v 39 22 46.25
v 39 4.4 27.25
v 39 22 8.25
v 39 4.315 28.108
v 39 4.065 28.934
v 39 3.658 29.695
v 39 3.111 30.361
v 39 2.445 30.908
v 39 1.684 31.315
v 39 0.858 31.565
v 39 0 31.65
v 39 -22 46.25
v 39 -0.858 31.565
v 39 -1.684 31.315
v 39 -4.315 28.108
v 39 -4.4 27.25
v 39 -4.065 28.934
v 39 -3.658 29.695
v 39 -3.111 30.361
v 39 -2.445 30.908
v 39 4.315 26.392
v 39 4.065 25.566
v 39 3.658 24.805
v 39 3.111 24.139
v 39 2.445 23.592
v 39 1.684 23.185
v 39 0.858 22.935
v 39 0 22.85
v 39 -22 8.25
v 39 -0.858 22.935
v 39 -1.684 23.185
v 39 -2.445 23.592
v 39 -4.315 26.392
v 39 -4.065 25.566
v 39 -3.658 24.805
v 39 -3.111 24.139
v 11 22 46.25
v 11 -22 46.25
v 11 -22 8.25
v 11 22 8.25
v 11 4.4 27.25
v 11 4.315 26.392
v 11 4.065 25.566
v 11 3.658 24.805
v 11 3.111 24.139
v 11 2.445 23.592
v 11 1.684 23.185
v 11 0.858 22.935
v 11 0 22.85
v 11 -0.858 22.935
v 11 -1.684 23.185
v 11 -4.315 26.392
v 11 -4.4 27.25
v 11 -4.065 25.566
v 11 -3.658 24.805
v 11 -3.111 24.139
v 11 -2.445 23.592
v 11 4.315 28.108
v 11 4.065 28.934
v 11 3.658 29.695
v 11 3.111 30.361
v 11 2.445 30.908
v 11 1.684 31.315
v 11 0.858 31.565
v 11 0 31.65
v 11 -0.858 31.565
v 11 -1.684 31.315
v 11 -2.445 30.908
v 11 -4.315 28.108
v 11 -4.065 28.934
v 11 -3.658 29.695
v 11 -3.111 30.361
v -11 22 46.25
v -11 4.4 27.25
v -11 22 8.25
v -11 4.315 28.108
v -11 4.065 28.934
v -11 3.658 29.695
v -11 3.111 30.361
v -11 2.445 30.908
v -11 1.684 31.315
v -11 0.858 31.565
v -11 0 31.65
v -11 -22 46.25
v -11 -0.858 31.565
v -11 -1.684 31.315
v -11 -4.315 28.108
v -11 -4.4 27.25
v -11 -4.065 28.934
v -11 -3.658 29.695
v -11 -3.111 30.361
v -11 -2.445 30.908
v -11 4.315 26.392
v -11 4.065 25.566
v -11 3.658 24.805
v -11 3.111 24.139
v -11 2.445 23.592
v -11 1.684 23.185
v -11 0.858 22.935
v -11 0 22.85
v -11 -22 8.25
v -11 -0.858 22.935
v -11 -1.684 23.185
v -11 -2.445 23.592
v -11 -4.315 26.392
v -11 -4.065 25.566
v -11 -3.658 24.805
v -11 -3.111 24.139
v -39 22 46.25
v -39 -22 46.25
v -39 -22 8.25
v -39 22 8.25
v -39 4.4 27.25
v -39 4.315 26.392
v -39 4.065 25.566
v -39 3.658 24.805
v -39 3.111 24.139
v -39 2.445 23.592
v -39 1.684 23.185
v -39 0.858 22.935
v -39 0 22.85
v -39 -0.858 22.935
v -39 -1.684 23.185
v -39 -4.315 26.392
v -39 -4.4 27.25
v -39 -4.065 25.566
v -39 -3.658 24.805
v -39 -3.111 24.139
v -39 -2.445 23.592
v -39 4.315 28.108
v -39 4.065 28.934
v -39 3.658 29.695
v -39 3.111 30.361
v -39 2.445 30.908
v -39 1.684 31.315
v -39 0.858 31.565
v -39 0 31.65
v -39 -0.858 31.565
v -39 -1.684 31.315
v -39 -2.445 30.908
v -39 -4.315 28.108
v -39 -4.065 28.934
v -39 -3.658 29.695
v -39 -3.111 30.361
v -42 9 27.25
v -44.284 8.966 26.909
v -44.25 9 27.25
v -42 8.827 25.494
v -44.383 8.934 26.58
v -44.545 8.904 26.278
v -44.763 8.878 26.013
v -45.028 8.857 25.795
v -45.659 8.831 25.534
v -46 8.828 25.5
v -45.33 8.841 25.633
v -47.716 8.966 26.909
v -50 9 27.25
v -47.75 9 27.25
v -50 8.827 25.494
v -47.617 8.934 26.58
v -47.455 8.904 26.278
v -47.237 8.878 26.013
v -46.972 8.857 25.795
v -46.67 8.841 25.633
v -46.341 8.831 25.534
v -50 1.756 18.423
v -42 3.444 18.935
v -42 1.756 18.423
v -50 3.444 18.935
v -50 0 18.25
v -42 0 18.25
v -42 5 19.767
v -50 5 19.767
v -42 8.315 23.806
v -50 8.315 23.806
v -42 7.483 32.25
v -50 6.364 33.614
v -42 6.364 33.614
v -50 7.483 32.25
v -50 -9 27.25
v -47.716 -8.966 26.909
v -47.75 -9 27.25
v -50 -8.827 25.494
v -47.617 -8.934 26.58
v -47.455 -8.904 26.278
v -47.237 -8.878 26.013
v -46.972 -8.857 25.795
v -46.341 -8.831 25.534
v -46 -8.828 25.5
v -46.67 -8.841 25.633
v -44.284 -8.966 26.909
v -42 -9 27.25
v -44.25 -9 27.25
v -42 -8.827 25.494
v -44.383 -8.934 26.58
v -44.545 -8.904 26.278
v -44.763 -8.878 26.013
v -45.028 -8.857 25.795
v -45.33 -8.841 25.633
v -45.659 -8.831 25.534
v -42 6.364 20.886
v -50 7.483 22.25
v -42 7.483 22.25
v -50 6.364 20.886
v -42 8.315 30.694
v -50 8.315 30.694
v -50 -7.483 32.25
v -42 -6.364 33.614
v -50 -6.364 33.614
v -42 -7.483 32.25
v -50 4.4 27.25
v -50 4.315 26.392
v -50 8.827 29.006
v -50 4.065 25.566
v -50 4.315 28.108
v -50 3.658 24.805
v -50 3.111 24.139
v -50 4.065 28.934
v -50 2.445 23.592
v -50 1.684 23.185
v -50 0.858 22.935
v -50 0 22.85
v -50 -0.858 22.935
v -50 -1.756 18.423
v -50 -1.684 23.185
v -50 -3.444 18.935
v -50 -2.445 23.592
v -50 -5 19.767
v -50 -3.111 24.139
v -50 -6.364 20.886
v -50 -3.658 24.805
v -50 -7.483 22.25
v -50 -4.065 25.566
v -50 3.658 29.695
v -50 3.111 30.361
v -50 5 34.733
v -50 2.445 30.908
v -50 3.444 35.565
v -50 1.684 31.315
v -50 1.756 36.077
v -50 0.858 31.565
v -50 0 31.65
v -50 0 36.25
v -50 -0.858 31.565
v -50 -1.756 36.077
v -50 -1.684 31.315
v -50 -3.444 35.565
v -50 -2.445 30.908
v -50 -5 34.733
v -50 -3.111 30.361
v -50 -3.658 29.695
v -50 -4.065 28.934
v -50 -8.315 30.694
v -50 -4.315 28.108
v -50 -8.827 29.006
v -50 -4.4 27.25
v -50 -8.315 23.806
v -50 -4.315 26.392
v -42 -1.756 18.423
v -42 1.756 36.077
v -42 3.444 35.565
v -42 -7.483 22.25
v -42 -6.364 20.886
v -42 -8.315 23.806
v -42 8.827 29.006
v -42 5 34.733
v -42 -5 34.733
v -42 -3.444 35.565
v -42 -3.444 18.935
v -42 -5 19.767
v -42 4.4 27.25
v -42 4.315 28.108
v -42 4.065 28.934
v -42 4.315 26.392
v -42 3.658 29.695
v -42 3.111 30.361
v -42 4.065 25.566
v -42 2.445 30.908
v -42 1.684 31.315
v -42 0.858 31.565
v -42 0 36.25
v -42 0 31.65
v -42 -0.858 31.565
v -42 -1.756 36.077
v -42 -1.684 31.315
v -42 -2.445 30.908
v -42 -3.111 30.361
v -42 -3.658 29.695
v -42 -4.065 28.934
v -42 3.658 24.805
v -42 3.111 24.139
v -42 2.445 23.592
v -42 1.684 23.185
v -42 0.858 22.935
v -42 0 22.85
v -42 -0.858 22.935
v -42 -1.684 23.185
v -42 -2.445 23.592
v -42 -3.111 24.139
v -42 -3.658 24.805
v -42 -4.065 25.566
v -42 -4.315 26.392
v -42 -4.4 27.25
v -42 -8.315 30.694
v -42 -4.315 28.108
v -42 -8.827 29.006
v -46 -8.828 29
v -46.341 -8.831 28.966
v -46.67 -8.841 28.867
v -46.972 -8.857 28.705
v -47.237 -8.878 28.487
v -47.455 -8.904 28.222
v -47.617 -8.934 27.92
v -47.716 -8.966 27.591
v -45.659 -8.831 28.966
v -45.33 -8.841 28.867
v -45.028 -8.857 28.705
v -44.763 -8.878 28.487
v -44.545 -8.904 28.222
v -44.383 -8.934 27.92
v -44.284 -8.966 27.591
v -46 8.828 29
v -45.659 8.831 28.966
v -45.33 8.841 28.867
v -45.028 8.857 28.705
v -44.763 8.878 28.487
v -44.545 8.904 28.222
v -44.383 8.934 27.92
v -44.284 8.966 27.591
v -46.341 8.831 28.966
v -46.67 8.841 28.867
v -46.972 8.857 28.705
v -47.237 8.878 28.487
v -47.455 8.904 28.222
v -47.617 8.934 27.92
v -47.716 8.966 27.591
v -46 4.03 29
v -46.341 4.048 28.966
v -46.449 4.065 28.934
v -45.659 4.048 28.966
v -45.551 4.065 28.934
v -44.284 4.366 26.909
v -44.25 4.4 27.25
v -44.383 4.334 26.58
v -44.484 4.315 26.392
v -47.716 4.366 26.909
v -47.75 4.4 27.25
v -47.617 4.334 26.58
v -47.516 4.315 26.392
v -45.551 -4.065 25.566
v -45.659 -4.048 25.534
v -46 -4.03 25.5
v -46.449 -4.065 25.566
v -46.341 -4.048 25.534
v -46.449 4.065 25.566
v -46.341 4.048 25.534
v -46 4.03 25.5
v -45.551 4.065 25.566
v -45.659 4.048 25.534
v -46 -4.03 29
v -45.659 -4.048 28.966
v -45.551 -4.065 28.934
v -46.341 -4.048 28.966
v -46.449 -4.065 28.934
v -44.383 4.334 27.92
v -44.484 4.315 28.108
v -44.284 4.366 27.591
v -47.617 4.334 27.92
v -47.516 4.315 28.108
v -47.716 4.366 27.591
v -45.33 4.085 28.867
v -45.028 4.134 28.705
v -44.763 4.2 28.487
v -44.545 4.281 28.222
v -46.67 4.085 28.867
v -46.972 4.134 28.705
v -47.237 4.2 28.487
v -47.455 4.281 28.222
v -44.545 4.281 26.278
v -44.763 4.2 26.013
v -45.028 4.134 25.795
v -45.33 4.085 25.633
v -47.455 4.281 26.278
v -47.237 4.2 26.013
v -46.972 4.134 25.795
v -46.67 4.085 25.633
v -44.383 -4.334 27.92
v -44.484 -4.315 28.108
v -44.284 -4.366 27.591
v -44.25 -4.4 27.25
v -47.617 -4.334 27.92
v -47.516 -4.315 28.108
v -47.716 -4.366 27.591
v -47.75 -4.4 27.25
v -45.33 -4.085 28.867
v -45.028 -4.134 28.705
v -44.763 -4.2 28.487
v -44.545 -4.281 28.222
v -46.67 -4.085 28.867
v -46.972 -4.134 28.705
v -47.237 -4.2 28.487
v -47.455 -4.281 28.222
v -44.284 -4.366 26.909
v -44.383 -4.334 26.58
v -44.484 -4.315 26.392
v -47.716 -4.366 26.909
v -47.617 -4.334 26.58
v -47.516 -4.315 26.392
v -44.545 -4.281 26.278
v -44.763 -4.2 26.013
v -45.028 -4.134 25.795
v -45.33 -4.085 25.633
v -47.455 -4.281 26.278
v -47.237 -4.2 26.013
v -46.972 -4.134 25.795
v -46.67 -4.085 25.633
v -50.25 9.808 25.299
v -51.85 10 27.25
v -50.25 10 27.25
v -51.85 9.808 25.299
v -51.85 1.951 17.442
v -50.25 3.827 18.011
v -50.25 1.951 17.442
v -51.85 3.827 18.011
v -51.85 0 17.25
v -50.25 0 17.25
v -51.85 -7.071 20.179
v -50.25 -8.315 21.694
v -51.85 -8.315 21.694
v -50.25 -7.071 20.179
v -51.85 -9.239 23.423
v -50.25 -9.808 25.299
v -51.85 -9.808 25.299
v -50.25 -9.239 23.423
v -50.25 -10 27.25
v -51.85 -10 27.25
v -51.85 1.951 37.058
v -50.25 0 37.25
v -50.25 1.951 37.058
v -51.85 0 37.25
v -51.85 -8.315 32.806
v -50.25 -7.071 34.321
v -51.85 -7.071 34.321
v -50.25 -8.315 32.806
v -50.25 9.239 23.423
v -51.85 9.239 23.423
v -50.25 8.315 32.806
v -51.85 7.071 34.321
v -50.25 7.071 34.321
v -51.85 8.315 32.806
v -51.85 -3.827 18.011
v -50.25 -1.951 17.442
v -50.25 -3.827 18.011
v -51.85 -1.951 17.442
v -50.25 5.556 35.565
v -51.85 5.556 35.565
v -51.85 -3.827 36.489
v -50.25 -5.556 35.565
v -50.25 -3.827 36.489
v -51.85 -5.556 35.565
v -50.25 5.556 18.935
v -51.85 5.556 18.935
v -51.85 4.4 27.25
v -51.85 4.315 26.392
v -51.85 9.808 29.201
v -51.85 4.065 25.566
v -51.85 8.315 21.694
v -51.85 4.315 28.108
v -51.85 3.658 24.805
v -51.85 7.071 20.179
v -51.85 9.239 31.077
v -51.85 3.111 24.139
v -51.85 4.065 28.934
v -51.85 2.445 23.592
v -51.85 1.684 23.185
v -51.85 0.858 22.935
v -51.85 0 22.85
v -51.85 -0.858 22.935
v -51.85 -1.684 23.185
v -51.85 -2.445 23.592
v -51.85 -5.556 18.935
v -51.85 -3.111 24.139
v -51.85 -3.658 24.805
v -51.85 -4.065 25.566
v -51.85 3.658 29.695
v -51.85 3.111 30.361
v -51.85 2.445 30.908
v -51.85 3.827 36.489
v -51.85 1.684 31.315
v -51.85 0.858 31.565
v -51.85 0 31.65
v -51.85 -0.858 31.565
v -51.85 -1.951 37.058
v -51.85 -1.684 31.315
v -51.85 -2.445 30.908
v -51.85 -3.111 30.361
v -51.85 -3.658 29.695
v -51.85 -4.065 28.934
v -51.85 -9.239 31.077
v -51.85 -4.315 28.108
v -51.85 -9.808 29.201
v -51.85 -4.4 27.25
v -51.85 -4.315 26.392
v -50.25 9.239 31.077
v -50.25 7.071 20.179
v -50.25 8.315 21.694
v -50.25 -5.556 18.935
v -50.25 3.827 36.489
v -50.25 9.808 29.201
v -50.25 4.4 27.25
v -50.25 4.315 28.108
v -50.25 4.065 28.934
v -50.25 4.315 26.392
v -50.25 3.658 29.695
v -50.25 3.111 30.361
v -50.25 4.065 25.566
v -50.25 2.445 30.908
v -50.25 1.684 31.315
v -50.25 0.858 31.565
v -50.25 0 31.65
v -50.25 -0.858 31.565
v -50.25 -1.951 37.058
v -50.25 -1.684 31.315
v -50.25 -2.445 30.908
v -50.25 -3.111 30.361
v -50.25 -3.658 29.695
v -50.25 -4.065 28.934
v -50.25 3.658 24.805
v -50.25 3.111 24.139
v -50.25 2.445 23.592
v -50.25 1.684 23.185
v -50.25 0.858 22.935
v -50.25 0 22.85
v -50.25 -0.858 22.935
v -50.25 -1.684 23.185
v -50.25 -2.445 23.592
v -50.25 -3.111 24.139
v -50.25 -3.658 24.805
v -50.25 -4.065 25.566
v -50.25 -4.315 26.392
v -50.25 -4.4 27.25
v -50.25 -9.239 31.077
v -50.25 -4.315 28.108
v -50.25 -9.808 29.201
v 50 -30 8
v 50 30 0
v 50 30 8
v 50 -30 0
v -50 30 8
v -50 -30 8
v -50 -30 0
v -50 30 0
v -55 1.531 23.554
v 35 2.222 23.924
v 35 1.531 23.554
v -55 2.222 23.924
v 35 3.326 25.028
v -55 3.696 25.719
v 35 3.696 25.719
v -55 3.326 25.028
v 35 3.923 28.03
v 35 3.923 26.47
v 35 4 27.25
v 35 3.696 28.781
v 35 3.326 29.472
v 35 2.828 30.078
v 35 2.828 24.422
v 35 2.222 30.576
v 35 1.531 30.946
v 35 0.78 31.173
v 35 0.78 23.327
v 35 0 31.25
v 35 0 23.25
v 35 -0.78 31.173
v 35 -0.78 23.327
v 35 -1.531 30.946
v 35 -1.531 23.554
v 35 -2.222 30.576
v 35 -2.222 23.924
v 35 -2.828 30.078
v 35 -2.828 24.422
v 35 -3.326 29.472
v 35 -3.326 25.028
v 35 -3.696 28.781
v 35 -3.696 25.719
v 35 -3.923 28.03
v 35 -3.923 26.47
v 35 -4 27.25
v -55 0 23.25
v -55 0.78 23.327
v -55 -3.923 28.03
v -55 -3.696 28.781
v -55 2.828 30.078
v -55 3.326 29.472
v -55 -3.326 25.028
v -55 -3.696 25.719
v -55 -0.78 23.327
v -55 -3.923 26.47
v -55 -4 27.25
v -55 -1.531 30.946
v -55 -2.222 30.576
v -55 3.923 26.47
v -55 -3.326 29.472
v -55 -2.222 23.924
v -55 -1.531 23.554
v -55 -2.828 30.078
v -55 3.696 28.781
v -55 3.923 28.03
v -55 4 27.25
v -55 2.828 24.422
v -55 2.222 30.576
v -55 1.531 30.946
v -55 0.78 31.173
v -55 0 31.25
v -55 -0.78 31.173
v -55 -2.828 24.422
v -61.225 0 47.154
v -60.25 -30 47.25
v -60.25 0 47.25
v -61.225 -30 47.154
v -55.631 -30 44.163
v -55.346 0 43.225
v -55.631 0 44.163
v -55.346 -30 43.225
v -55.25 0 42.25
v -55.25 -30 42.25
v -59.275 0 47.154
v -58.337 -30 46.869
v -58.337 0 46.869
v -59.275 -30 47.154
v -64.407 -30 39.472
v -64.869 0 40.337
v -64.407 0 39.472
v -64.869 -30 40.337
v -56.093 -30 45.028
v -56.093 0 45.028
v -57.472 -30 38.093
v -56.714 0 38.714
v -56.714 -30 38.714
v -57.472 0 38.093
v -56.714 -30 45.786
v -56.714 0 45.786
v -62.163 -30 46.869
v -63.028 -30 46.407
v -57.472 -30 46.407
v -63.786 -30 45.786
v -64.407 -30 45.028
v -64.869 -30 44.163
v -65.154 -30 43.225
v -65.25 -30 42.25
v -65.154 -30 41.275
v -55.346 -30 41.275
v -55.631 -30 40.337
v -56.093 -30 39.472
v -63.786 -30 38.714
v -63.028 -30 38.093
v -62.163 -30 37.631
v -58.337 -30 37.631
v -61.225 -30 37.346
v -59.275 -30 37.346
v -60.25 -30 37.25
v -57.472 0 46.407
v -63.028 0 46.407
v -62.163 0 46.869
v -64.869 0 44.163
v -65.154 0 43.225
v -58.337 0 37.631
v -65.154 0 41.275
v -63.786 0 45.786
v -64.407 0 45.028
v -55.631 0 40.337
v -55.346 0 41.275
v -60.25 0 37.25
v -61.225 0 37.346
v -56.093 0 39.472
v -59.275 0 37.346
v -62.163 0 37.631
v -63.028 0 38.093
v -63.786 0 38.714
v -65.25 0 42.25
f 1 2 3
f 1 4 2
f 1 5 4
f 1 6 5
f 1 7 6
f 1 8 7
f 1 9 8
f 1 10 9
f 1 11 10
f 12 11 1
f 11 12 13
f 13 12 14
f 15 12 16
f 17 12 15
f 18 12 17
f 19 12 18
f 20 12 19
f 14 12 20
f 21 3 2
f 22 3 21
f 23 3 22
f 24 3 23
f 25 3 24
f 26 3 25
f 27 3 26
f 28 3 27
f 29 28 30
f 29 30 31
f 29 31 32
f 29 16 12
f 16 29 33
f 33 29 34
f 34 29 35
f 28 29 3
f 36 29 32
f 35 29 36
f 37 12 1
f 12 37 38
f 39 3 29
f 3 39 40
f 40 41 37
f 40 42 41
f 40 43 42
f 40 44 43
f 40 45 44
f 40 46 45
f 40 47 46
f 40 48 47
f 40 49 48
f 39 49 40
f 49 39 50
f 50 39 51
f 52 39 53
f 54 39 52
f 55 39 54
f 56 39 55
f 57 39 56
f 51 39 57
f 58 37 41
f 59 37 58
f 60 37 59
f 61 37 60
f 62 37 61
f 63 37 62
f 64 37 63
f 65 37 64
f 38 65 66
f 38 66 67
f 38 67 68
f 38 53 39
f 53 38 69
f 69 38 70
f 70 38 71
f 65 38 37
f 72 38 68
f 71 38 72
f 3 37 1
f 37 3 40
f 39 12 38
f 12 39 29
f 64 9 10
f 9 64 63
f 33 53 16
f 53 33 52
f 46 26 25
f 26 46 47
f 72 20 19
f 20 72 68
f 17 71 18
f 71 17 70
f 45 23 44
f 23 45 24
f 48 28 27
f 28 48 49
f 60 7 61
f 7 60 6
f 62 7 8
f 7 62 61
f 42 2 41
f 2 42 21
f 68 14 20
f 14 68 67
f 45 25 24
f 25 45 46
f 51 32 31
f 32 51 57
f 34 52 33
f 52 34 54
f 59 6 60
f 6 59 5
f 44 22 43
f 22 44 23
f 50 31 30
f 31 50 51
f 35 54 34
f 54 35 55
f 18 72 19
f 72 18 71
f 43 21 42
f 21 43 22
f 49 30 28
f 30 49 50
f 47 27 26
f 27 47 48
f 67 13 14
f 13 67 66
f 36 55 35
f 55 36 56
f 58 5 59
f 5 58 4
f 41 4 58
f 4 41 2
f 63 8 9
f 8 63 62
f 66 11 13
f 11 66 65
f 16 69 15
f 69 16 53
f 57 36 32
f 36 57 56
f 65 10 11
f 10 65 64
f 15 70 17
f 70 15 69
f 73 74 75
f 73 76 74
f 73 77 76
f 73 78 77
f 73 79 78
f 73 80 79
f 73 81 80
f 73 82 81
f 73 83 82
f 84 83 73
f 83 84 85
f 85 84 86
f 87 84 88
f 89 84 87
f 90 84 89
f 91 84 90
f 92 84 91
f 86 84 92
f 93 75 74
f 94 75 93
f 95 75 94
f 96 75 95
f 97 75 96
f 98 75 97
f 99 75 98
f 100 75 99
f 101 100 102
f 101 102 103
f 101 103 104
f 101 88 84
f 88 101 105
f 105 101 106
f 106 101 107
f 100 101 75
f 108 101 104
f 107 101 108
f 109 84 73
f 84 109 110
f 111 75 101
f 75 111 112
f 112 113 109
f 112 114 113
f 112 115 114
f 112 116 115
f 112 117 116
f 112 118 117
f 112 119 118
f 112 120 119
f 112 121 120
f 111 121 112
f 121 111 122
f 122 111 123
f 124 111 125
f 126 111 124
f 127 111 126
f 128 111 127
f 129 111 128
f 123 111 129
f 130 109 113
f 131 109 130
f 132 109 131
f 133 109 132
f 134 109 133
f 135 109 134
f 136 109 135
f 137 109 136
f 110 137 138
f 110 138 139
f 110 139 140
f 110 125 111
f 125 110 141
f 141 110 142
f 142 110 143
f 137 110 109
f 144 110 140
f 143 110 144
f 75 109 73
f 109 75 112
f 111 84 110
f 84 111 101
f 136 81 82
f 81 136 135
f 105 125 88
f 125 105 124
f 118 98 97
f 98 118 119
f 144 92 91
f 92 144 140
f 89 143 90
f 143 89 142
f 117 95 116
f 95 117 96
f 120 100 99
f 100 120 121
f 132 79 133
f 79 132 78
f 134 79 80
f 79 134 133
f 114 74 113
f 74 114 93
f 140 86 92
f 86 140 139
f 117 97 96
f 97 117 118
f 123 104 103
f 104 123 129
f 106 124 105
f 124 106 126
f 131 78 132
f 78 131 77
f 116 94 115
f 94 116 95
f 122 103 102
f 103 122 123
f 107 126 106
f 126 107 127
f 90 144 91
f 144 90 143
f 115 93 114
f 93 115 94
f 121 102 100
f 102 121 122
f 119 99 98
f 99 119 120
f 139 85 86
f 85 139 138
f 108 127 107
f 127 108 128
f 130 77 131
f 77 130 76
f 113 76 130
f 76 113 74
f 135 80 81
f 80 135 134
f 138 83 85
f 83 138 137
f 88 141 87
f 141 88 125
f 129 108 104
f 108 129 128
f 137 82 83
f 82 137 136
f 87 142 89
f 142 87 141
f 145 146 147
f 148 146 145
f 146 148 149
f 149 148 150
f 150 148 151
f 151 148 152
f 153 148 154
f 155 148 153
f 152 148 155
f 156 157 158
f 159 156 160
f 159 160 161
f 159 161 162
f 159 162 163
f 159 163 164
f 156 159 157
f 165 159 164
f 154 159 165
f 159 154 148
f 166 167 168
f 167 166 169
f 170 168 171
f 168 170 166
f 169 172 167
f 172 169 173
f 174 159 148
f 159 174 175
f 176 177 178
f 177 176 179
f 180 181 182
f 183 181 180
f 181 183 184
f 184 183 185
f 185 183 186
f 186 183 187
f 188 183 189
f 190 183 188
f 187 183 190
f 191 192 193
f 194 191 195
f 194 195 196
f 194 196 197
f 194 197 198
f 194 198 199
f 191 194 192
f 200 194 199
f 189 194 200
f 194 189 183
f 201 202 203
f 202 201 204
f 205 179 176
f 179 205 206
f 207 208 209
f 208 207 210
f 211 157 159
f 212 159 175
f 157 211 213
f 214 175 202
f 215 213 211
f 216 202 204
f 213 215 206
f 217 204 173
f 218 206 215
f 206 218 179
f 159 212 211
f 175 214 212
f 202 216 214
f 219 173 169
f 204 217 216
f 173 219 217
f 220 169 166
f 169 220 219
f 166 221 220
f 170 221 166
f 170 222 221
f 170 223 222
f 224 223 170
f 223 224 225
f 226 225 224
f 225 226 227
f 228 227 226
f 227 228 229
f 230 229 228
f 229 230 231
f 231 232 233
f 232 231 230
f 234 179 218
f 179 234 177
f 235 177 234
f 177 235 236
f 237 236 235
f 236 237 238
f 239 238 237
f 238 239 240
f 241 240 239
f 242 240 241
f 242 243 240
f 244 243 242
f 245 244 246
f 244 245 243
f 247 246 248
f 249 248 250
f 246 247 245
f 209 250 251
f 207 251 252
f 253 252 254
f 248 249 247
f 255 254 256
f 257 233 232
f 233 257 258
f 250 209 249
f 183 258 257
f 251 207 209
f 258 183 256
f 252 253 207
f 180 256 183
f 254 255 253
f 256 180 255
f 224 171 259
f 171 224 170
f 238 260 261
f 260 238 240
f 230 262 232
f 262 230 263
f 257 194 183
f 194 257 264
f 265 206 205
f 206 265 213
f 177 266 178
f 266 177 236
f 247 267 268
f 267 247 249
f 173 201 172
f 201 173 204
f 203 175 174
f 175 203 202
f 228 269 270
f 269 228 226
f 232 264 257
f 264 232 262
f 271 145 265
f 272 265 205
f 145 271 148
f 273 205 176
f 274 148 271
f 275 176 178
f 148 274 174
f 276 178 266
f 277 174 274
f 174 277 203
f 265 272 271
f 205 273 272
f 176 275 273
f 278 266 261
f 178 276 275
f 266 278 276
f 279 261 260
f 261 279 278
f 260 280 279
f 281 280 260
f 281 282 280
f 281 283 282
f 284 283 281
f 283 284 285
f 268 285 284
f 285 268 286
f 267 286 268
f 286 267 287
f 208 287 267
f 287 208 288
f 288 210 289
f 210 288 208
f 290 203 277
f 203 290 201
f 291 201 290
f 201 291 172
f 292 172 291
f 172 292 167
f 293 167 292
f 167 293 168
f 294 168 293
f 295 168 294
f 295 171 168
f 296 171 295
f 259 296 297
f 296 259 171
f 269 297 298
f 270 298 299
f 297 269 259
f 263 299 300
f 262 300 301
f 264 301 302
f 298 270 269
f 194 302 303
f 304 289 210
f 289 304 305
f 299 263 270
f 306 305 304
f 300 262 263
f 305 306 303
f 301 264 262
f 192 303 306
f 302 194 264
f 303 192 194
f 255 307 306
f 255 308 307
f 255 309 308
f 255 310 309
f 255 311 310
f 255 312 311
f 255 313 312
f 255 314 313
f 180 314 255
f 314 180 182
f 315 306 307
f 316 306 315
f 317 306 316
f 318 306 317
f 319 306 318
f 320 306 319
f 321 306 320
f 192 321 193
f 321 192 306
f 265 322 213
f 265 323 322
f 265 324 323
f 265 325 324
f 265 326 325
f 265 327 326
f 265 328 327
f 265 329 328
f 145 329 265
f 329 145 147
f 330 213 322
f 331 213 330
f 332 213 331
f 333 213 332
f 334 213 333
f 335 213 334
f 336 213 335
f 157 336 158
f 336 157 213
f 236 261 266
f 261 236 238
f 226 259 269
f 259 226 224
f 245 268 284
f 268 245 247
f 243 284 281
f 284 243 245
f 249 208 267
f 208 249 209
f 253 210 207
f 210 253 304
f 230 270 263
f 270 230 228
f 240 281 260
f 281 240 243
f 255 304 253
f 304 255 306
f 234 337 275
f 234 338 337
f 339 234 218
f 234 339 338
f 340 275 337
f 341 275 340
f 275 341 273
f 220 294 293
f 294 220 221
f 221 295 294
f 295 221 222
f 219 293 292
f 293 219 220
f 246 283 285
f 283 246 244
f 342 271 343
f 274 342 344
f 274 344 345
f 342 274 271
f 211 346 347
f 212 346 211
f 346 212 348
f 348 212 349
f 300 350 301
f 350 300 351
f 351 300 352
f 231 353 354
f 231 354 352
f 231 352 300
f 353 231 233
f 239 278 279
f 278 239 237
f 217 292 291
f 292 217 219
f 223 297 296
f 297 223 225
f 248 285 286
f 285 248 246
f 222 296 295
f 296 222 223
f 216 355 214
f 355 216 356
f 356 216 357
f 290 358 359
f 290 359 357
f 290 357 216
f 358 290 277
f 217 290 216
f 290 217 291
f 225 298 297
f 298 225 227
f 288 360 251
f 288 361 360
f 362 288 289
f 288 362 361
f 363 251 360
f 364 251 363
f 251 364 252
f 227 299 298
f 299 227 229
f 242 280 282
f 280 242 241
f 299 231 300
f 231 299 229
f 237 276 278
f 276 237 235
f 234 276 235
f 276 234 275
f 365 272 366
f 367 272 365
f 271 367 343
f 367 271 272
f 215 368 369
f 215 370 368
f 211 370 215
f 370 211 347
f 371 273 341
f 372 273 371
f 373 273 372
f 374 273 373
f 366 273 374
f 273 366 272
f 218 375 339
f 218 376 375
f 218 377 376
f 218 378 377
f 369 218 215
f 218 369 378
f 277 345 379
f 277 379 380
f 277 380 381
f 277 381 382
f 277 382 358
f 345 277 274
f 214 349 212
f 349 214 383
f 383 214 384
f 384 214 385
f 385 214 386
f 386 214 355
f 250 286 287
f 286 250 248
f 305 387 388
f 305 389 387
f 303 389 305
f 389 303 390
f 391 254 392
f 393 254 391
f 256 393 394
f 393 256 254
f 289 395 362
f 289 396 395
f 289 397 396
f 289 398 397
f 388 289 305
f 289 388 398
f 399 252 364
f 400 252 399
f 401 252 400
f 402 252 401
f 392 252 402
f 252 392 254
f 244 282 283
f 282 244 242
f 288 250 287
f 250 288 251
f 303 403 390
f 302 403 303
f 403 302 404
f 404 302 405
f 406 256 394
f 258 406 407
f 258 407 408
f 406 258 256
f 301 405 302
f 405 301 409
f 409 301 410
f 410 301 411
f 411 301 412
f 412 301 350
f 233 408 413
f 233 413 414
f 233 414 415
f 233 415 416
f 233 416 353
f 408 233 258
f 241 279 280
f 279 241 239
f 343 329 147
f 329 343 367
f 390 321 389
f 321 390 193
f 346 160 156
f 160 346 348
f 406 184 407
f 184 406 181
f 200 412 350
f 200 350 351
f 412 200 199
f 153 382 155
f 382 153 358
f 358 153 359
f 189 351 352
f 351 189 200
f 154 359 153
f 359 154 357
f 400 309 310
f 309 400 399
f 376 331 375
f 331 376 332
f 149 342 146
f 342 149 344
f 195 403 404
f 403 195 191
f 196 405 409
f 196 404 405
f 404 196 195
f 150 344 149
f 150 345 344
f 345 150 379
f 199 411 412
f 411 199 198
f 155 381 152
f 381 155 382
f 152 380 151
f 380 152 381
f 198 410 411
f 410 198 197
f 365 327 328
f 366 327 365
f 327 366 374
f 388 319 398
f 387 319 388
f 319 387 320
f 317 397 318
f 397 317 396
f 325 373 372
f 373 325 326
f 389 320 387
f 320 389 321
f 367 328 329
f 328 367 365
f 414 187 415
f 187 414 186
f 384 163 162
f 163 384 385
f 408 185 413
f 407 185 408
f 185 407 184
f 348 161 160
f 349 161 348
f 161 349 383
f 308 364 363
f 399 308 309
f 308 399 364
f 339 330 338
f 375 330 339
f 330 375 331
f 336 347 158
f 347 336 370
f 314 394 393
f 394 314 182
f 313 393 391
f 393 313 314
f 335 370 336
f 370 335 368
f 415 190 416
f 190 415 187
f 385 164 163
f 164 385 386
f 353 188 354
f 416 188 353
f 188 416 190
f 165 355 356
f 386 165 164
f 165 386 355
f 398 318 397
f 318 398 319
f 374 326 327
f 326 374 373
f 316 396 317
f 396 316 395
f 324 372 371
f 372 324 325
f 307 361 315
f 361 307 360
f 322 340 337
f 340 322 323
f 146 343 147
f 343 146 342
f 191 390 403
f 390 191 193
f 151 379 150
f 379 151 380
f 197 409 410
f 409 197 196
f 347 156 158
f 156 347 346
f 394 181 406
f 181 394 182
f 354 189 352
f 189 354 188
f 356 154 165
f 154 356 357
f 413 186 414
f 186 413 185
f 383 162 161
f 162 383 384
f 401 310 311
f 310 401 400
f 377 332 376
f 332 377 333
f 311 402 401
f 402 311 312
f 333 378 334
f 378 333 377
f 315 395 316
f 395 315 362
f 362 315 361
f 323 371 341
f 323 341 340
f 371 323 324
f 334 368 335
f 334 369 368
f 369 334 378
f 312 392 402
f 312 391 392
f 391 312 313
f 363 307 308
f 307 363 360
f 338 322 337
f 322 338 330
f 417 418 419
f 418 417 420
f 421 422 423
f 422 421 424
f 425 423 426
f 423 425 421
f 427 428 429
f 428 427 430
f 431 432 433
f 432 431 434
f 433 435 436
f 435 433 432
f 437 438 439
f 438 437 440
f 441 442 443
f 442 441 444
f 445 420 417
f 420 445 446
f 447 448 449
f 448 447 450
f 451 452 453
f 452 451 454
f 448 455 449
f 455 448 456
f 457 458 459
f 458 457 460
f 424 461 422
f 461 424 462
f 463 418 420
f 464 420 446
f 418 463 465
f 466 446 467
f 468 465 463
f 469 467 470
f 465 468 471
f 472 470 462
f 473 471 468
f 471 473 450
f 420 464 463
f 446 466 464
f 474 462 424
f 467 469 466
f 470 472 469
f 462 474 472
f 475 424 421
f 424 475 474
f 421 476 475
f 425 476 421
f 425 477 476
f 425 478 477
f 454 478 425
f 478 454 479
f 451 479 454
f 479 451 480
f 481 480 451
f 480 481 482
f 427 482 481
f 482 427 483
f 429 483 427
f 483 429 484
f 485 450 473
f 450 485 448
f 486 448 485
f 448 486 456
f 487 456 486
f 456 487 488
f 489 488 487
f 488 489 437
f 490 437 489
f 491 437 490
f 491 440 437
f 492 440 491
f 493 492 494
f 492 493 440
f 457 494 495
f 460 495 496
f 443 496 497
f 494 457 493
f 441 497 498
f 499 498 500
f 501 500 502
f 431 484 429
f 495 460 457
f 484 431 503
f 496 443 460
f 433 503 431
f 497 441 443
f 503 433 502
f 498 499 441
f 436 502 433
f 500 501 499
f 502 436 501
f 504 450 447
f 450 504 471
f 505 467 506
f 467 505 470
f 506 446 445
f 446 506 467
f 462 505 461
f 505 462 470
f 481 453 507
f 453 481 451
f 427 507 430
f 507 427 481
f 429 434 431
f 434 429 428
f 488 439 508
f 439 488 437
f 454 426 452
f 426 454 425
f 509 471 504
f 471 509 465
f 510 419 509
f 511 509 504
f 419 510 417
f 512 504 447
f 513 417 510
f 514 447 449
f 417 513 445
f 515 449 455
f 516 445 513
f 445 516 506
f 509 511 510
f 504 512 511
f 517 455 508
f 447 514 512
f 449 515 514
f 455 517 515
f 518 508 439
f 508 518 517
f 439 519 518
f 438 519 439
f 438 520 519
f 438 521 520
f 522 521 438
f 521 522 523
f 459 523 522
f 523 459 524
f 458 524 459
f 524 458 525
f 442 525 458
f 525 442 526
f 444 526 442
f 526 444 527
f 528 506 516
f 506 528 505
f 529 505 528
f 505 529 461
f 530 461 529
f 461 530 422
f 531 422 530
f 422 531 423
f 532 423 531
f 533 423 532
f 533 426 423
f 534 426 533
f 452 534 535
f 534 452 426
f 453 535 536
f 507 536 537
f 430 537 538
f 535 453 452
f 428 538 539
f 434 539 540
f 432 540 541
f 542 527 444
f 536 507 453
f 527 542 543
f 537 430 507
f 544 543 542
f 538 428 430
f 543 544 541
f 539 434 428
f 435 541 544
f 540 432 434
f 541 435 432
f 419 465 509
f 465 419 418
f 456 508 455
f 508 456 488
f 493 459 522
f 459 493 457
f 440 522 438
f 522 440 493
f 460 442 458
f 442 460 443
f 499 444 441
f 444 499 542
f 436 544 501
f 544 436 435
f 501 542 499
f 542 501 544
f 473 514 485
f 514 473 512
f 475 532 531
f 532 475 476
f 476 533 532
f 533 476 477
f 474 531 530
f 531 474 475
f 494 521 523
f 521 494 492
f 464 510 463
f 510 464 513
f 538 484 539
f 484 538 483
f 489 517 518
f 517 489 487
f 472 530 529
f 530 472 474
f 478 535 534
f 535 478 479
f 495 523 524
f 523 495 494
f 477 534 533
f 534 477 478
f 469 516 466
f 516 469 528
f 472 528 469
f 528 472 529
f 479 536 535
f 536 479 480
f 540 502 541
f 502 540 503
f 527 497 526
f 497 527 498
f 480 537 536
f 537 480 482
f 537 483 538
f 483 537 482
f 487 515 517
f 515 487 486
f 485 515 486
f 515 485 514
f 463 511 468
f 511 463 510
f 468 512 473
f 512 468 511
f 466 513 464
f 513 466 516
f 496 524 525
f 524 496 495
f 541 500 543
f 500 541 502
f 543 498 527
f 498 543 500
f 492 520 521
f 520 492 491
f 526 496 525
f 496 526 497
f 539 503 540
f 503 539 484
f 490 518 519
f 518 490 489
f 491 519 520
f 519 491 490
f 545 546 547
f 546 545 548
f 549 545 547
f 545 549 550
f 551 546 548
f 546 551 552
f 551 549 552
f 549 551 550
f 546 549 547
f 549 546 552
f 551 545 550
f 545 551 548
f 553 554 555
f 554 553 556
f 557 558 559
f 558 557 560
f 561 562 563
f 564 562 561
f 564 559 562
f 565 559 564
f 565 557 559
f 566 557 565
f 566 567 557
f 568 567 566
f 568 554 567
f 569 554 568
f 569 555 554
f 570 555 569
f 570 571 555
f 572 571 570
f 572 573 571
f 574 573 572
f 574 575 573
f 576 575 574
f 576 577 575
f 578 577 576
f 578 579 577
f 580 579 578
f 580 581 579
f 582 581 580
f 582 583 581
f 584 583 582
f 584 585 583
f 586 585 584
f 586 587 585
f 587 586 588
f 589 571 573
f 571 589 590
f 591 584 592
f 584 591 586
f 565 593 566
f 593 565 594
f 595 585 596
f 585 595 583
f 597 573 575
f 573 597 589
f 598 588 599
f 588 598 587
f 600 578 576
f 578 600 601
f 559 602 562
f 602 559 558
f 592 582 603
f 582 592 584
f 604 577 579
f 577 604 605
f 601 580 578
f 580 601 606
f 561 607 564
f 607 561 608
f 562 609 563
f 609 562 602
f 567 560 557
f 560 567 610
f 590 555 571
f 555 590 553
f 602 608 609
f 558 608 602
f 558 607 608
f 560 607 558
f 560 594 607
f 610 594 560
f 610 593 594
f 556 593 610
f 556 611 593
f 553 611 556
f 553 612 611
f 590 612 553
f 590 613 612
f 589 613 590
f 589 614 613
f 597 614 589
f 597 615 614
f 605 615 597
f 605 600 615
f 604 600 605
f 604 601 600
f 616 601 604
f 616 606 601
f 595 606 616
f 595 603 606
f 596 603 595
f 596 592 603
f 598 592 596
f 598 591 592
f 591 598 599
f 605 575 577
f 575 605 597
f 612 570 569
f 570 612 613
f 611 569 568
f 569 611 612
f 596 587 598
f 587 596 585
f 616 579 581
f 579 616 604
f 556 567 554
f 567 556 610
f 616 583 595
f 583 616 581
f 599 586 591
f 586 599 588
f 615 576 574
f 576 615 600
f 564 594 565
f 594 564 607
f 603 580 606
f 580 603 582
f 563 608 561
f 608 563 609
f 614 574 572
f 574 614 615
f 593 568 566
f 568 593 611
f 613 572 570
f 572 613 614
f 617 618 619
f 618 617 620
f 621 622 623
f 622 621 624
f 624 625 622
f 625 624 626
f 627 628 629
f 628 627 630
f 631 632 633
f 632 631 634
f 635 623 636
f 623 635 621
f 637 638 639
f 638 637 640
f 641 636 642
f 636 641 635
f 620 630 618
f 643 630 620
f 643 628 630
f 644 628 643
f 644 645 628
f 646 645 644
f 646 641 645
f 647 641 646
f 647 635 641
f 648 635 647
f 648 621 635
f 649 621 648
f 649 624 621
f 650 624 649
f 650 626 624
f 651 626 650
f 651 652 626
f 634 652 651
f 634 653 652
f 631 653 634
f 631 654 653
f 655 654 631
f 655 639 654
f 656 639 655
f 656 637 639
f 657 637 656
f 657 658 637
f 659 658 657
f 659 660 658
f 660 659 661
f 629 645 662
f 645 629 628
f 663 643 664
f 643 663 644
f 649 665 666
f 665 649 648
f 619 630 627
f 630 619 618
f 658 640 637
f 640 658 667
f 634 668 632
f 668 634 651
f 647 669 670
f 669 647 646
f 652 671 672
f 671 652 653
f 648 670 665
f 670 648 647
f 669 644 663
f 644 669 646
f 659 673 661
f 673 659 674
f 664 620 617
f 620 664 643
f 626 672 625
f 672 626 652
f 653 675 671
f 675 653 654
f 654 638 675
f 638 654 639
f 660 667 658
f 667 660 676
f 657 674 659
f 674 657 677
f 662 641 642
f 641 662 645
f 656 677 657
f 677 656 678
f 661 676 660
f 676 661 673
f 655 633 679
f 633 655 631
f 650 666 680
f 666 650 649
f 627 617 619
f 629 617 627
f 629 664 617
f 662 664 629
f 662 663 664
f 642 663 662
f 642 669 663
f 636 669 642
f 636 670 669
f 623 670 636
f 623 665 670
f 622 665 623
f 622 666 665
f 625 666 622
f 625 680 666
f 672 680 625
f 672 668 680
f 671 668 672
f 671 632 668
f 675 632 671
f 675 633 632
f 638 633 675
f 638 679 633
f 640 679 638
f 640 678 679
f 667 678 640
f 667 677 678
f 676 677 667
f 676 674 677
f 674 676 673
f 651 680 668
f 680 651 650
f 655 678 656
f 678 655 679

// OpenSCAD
$fn = 32;

// ------------------------------------------------------------------------
// Machine vise: screw d8, jaws 28 x 38 mm
// Every part is its own module, assembly() places every instance.
// ------------------------------------------------------------------------

// --- part 1 ---
module vise_bed() {
  difference() {
    translate([-50, -30, 0]) cube([100, 60, 8]);
  }
}

// --- part 2 ---
module vise_jaw() {
  difference() {
    translate([-14, -22, 0]) cube([28, 44, 38]);
    translate([0, 0, 19]) rotate([0, 90, 0]) cylinder(h = 30, d = 8.8, center = true);
  }
}

// --- part 3 ---
module vise_screw() {
  translate([0, 0, -45]) cylinder(h = 90, d = 8);
}

// --- part 4 ---
module screw_collar() {
  difference() {
    cylinder(h = 8, d = 18);
    translate([0, 0, -1]) cylinder(h = 10, d = 8.8);
    translate([0, 0, 4]) rotate([90, 0, 0]) cylinder(h = 20, d = 3.5, center = true);
  }
}

// --- part 5 ---
module screw_washer() {
  difference() {
      translate([0, 0, 0]) cylinder(h = 1.6, d = 20);
      translate([0, 0, -1]) cylinder(h = 3.6, d = 8.8);
    }
}

// --- part 6 ---
module vise_handle() {
  cylinder(h = 30, d = 10);
}

// --- assembly ---
module assembly() {
  color([0.80, 0.24, 0.20]) translate([0, 0, 0]) rotate([0, 0, 0]) vise_bed();
  color([0.20, 0.45, 0.75]) translate([25, 0, 8.25]) rotate([0, 0, 0]) vise_jaw();
  color([0.25, 0.62, 0.32]) translate([-25, 0, 8.25]) rotate([0, 0, 0]) vise_jaw();
  color([0.92, 0.70, 0.18]) translate([-10, 0, 27.25]) rotate([0, 90, 0]) vise_screw();
  color([0.58, 0.35, 0.70]) translate([-50, 0, 27.25]) rotate([0, 90, 0]) screw_collar();
  color([0.16, 0.66, 0.66]) translate([-51.85, 0, 27.25]) rotate([0, 90, 0]) screw_washer();
  color([0.85, 0.48, 0.18]) translate([-60.25, 0, 42.25]) rotate([90, 0, 0]) vise_handle();
}

assembly();
